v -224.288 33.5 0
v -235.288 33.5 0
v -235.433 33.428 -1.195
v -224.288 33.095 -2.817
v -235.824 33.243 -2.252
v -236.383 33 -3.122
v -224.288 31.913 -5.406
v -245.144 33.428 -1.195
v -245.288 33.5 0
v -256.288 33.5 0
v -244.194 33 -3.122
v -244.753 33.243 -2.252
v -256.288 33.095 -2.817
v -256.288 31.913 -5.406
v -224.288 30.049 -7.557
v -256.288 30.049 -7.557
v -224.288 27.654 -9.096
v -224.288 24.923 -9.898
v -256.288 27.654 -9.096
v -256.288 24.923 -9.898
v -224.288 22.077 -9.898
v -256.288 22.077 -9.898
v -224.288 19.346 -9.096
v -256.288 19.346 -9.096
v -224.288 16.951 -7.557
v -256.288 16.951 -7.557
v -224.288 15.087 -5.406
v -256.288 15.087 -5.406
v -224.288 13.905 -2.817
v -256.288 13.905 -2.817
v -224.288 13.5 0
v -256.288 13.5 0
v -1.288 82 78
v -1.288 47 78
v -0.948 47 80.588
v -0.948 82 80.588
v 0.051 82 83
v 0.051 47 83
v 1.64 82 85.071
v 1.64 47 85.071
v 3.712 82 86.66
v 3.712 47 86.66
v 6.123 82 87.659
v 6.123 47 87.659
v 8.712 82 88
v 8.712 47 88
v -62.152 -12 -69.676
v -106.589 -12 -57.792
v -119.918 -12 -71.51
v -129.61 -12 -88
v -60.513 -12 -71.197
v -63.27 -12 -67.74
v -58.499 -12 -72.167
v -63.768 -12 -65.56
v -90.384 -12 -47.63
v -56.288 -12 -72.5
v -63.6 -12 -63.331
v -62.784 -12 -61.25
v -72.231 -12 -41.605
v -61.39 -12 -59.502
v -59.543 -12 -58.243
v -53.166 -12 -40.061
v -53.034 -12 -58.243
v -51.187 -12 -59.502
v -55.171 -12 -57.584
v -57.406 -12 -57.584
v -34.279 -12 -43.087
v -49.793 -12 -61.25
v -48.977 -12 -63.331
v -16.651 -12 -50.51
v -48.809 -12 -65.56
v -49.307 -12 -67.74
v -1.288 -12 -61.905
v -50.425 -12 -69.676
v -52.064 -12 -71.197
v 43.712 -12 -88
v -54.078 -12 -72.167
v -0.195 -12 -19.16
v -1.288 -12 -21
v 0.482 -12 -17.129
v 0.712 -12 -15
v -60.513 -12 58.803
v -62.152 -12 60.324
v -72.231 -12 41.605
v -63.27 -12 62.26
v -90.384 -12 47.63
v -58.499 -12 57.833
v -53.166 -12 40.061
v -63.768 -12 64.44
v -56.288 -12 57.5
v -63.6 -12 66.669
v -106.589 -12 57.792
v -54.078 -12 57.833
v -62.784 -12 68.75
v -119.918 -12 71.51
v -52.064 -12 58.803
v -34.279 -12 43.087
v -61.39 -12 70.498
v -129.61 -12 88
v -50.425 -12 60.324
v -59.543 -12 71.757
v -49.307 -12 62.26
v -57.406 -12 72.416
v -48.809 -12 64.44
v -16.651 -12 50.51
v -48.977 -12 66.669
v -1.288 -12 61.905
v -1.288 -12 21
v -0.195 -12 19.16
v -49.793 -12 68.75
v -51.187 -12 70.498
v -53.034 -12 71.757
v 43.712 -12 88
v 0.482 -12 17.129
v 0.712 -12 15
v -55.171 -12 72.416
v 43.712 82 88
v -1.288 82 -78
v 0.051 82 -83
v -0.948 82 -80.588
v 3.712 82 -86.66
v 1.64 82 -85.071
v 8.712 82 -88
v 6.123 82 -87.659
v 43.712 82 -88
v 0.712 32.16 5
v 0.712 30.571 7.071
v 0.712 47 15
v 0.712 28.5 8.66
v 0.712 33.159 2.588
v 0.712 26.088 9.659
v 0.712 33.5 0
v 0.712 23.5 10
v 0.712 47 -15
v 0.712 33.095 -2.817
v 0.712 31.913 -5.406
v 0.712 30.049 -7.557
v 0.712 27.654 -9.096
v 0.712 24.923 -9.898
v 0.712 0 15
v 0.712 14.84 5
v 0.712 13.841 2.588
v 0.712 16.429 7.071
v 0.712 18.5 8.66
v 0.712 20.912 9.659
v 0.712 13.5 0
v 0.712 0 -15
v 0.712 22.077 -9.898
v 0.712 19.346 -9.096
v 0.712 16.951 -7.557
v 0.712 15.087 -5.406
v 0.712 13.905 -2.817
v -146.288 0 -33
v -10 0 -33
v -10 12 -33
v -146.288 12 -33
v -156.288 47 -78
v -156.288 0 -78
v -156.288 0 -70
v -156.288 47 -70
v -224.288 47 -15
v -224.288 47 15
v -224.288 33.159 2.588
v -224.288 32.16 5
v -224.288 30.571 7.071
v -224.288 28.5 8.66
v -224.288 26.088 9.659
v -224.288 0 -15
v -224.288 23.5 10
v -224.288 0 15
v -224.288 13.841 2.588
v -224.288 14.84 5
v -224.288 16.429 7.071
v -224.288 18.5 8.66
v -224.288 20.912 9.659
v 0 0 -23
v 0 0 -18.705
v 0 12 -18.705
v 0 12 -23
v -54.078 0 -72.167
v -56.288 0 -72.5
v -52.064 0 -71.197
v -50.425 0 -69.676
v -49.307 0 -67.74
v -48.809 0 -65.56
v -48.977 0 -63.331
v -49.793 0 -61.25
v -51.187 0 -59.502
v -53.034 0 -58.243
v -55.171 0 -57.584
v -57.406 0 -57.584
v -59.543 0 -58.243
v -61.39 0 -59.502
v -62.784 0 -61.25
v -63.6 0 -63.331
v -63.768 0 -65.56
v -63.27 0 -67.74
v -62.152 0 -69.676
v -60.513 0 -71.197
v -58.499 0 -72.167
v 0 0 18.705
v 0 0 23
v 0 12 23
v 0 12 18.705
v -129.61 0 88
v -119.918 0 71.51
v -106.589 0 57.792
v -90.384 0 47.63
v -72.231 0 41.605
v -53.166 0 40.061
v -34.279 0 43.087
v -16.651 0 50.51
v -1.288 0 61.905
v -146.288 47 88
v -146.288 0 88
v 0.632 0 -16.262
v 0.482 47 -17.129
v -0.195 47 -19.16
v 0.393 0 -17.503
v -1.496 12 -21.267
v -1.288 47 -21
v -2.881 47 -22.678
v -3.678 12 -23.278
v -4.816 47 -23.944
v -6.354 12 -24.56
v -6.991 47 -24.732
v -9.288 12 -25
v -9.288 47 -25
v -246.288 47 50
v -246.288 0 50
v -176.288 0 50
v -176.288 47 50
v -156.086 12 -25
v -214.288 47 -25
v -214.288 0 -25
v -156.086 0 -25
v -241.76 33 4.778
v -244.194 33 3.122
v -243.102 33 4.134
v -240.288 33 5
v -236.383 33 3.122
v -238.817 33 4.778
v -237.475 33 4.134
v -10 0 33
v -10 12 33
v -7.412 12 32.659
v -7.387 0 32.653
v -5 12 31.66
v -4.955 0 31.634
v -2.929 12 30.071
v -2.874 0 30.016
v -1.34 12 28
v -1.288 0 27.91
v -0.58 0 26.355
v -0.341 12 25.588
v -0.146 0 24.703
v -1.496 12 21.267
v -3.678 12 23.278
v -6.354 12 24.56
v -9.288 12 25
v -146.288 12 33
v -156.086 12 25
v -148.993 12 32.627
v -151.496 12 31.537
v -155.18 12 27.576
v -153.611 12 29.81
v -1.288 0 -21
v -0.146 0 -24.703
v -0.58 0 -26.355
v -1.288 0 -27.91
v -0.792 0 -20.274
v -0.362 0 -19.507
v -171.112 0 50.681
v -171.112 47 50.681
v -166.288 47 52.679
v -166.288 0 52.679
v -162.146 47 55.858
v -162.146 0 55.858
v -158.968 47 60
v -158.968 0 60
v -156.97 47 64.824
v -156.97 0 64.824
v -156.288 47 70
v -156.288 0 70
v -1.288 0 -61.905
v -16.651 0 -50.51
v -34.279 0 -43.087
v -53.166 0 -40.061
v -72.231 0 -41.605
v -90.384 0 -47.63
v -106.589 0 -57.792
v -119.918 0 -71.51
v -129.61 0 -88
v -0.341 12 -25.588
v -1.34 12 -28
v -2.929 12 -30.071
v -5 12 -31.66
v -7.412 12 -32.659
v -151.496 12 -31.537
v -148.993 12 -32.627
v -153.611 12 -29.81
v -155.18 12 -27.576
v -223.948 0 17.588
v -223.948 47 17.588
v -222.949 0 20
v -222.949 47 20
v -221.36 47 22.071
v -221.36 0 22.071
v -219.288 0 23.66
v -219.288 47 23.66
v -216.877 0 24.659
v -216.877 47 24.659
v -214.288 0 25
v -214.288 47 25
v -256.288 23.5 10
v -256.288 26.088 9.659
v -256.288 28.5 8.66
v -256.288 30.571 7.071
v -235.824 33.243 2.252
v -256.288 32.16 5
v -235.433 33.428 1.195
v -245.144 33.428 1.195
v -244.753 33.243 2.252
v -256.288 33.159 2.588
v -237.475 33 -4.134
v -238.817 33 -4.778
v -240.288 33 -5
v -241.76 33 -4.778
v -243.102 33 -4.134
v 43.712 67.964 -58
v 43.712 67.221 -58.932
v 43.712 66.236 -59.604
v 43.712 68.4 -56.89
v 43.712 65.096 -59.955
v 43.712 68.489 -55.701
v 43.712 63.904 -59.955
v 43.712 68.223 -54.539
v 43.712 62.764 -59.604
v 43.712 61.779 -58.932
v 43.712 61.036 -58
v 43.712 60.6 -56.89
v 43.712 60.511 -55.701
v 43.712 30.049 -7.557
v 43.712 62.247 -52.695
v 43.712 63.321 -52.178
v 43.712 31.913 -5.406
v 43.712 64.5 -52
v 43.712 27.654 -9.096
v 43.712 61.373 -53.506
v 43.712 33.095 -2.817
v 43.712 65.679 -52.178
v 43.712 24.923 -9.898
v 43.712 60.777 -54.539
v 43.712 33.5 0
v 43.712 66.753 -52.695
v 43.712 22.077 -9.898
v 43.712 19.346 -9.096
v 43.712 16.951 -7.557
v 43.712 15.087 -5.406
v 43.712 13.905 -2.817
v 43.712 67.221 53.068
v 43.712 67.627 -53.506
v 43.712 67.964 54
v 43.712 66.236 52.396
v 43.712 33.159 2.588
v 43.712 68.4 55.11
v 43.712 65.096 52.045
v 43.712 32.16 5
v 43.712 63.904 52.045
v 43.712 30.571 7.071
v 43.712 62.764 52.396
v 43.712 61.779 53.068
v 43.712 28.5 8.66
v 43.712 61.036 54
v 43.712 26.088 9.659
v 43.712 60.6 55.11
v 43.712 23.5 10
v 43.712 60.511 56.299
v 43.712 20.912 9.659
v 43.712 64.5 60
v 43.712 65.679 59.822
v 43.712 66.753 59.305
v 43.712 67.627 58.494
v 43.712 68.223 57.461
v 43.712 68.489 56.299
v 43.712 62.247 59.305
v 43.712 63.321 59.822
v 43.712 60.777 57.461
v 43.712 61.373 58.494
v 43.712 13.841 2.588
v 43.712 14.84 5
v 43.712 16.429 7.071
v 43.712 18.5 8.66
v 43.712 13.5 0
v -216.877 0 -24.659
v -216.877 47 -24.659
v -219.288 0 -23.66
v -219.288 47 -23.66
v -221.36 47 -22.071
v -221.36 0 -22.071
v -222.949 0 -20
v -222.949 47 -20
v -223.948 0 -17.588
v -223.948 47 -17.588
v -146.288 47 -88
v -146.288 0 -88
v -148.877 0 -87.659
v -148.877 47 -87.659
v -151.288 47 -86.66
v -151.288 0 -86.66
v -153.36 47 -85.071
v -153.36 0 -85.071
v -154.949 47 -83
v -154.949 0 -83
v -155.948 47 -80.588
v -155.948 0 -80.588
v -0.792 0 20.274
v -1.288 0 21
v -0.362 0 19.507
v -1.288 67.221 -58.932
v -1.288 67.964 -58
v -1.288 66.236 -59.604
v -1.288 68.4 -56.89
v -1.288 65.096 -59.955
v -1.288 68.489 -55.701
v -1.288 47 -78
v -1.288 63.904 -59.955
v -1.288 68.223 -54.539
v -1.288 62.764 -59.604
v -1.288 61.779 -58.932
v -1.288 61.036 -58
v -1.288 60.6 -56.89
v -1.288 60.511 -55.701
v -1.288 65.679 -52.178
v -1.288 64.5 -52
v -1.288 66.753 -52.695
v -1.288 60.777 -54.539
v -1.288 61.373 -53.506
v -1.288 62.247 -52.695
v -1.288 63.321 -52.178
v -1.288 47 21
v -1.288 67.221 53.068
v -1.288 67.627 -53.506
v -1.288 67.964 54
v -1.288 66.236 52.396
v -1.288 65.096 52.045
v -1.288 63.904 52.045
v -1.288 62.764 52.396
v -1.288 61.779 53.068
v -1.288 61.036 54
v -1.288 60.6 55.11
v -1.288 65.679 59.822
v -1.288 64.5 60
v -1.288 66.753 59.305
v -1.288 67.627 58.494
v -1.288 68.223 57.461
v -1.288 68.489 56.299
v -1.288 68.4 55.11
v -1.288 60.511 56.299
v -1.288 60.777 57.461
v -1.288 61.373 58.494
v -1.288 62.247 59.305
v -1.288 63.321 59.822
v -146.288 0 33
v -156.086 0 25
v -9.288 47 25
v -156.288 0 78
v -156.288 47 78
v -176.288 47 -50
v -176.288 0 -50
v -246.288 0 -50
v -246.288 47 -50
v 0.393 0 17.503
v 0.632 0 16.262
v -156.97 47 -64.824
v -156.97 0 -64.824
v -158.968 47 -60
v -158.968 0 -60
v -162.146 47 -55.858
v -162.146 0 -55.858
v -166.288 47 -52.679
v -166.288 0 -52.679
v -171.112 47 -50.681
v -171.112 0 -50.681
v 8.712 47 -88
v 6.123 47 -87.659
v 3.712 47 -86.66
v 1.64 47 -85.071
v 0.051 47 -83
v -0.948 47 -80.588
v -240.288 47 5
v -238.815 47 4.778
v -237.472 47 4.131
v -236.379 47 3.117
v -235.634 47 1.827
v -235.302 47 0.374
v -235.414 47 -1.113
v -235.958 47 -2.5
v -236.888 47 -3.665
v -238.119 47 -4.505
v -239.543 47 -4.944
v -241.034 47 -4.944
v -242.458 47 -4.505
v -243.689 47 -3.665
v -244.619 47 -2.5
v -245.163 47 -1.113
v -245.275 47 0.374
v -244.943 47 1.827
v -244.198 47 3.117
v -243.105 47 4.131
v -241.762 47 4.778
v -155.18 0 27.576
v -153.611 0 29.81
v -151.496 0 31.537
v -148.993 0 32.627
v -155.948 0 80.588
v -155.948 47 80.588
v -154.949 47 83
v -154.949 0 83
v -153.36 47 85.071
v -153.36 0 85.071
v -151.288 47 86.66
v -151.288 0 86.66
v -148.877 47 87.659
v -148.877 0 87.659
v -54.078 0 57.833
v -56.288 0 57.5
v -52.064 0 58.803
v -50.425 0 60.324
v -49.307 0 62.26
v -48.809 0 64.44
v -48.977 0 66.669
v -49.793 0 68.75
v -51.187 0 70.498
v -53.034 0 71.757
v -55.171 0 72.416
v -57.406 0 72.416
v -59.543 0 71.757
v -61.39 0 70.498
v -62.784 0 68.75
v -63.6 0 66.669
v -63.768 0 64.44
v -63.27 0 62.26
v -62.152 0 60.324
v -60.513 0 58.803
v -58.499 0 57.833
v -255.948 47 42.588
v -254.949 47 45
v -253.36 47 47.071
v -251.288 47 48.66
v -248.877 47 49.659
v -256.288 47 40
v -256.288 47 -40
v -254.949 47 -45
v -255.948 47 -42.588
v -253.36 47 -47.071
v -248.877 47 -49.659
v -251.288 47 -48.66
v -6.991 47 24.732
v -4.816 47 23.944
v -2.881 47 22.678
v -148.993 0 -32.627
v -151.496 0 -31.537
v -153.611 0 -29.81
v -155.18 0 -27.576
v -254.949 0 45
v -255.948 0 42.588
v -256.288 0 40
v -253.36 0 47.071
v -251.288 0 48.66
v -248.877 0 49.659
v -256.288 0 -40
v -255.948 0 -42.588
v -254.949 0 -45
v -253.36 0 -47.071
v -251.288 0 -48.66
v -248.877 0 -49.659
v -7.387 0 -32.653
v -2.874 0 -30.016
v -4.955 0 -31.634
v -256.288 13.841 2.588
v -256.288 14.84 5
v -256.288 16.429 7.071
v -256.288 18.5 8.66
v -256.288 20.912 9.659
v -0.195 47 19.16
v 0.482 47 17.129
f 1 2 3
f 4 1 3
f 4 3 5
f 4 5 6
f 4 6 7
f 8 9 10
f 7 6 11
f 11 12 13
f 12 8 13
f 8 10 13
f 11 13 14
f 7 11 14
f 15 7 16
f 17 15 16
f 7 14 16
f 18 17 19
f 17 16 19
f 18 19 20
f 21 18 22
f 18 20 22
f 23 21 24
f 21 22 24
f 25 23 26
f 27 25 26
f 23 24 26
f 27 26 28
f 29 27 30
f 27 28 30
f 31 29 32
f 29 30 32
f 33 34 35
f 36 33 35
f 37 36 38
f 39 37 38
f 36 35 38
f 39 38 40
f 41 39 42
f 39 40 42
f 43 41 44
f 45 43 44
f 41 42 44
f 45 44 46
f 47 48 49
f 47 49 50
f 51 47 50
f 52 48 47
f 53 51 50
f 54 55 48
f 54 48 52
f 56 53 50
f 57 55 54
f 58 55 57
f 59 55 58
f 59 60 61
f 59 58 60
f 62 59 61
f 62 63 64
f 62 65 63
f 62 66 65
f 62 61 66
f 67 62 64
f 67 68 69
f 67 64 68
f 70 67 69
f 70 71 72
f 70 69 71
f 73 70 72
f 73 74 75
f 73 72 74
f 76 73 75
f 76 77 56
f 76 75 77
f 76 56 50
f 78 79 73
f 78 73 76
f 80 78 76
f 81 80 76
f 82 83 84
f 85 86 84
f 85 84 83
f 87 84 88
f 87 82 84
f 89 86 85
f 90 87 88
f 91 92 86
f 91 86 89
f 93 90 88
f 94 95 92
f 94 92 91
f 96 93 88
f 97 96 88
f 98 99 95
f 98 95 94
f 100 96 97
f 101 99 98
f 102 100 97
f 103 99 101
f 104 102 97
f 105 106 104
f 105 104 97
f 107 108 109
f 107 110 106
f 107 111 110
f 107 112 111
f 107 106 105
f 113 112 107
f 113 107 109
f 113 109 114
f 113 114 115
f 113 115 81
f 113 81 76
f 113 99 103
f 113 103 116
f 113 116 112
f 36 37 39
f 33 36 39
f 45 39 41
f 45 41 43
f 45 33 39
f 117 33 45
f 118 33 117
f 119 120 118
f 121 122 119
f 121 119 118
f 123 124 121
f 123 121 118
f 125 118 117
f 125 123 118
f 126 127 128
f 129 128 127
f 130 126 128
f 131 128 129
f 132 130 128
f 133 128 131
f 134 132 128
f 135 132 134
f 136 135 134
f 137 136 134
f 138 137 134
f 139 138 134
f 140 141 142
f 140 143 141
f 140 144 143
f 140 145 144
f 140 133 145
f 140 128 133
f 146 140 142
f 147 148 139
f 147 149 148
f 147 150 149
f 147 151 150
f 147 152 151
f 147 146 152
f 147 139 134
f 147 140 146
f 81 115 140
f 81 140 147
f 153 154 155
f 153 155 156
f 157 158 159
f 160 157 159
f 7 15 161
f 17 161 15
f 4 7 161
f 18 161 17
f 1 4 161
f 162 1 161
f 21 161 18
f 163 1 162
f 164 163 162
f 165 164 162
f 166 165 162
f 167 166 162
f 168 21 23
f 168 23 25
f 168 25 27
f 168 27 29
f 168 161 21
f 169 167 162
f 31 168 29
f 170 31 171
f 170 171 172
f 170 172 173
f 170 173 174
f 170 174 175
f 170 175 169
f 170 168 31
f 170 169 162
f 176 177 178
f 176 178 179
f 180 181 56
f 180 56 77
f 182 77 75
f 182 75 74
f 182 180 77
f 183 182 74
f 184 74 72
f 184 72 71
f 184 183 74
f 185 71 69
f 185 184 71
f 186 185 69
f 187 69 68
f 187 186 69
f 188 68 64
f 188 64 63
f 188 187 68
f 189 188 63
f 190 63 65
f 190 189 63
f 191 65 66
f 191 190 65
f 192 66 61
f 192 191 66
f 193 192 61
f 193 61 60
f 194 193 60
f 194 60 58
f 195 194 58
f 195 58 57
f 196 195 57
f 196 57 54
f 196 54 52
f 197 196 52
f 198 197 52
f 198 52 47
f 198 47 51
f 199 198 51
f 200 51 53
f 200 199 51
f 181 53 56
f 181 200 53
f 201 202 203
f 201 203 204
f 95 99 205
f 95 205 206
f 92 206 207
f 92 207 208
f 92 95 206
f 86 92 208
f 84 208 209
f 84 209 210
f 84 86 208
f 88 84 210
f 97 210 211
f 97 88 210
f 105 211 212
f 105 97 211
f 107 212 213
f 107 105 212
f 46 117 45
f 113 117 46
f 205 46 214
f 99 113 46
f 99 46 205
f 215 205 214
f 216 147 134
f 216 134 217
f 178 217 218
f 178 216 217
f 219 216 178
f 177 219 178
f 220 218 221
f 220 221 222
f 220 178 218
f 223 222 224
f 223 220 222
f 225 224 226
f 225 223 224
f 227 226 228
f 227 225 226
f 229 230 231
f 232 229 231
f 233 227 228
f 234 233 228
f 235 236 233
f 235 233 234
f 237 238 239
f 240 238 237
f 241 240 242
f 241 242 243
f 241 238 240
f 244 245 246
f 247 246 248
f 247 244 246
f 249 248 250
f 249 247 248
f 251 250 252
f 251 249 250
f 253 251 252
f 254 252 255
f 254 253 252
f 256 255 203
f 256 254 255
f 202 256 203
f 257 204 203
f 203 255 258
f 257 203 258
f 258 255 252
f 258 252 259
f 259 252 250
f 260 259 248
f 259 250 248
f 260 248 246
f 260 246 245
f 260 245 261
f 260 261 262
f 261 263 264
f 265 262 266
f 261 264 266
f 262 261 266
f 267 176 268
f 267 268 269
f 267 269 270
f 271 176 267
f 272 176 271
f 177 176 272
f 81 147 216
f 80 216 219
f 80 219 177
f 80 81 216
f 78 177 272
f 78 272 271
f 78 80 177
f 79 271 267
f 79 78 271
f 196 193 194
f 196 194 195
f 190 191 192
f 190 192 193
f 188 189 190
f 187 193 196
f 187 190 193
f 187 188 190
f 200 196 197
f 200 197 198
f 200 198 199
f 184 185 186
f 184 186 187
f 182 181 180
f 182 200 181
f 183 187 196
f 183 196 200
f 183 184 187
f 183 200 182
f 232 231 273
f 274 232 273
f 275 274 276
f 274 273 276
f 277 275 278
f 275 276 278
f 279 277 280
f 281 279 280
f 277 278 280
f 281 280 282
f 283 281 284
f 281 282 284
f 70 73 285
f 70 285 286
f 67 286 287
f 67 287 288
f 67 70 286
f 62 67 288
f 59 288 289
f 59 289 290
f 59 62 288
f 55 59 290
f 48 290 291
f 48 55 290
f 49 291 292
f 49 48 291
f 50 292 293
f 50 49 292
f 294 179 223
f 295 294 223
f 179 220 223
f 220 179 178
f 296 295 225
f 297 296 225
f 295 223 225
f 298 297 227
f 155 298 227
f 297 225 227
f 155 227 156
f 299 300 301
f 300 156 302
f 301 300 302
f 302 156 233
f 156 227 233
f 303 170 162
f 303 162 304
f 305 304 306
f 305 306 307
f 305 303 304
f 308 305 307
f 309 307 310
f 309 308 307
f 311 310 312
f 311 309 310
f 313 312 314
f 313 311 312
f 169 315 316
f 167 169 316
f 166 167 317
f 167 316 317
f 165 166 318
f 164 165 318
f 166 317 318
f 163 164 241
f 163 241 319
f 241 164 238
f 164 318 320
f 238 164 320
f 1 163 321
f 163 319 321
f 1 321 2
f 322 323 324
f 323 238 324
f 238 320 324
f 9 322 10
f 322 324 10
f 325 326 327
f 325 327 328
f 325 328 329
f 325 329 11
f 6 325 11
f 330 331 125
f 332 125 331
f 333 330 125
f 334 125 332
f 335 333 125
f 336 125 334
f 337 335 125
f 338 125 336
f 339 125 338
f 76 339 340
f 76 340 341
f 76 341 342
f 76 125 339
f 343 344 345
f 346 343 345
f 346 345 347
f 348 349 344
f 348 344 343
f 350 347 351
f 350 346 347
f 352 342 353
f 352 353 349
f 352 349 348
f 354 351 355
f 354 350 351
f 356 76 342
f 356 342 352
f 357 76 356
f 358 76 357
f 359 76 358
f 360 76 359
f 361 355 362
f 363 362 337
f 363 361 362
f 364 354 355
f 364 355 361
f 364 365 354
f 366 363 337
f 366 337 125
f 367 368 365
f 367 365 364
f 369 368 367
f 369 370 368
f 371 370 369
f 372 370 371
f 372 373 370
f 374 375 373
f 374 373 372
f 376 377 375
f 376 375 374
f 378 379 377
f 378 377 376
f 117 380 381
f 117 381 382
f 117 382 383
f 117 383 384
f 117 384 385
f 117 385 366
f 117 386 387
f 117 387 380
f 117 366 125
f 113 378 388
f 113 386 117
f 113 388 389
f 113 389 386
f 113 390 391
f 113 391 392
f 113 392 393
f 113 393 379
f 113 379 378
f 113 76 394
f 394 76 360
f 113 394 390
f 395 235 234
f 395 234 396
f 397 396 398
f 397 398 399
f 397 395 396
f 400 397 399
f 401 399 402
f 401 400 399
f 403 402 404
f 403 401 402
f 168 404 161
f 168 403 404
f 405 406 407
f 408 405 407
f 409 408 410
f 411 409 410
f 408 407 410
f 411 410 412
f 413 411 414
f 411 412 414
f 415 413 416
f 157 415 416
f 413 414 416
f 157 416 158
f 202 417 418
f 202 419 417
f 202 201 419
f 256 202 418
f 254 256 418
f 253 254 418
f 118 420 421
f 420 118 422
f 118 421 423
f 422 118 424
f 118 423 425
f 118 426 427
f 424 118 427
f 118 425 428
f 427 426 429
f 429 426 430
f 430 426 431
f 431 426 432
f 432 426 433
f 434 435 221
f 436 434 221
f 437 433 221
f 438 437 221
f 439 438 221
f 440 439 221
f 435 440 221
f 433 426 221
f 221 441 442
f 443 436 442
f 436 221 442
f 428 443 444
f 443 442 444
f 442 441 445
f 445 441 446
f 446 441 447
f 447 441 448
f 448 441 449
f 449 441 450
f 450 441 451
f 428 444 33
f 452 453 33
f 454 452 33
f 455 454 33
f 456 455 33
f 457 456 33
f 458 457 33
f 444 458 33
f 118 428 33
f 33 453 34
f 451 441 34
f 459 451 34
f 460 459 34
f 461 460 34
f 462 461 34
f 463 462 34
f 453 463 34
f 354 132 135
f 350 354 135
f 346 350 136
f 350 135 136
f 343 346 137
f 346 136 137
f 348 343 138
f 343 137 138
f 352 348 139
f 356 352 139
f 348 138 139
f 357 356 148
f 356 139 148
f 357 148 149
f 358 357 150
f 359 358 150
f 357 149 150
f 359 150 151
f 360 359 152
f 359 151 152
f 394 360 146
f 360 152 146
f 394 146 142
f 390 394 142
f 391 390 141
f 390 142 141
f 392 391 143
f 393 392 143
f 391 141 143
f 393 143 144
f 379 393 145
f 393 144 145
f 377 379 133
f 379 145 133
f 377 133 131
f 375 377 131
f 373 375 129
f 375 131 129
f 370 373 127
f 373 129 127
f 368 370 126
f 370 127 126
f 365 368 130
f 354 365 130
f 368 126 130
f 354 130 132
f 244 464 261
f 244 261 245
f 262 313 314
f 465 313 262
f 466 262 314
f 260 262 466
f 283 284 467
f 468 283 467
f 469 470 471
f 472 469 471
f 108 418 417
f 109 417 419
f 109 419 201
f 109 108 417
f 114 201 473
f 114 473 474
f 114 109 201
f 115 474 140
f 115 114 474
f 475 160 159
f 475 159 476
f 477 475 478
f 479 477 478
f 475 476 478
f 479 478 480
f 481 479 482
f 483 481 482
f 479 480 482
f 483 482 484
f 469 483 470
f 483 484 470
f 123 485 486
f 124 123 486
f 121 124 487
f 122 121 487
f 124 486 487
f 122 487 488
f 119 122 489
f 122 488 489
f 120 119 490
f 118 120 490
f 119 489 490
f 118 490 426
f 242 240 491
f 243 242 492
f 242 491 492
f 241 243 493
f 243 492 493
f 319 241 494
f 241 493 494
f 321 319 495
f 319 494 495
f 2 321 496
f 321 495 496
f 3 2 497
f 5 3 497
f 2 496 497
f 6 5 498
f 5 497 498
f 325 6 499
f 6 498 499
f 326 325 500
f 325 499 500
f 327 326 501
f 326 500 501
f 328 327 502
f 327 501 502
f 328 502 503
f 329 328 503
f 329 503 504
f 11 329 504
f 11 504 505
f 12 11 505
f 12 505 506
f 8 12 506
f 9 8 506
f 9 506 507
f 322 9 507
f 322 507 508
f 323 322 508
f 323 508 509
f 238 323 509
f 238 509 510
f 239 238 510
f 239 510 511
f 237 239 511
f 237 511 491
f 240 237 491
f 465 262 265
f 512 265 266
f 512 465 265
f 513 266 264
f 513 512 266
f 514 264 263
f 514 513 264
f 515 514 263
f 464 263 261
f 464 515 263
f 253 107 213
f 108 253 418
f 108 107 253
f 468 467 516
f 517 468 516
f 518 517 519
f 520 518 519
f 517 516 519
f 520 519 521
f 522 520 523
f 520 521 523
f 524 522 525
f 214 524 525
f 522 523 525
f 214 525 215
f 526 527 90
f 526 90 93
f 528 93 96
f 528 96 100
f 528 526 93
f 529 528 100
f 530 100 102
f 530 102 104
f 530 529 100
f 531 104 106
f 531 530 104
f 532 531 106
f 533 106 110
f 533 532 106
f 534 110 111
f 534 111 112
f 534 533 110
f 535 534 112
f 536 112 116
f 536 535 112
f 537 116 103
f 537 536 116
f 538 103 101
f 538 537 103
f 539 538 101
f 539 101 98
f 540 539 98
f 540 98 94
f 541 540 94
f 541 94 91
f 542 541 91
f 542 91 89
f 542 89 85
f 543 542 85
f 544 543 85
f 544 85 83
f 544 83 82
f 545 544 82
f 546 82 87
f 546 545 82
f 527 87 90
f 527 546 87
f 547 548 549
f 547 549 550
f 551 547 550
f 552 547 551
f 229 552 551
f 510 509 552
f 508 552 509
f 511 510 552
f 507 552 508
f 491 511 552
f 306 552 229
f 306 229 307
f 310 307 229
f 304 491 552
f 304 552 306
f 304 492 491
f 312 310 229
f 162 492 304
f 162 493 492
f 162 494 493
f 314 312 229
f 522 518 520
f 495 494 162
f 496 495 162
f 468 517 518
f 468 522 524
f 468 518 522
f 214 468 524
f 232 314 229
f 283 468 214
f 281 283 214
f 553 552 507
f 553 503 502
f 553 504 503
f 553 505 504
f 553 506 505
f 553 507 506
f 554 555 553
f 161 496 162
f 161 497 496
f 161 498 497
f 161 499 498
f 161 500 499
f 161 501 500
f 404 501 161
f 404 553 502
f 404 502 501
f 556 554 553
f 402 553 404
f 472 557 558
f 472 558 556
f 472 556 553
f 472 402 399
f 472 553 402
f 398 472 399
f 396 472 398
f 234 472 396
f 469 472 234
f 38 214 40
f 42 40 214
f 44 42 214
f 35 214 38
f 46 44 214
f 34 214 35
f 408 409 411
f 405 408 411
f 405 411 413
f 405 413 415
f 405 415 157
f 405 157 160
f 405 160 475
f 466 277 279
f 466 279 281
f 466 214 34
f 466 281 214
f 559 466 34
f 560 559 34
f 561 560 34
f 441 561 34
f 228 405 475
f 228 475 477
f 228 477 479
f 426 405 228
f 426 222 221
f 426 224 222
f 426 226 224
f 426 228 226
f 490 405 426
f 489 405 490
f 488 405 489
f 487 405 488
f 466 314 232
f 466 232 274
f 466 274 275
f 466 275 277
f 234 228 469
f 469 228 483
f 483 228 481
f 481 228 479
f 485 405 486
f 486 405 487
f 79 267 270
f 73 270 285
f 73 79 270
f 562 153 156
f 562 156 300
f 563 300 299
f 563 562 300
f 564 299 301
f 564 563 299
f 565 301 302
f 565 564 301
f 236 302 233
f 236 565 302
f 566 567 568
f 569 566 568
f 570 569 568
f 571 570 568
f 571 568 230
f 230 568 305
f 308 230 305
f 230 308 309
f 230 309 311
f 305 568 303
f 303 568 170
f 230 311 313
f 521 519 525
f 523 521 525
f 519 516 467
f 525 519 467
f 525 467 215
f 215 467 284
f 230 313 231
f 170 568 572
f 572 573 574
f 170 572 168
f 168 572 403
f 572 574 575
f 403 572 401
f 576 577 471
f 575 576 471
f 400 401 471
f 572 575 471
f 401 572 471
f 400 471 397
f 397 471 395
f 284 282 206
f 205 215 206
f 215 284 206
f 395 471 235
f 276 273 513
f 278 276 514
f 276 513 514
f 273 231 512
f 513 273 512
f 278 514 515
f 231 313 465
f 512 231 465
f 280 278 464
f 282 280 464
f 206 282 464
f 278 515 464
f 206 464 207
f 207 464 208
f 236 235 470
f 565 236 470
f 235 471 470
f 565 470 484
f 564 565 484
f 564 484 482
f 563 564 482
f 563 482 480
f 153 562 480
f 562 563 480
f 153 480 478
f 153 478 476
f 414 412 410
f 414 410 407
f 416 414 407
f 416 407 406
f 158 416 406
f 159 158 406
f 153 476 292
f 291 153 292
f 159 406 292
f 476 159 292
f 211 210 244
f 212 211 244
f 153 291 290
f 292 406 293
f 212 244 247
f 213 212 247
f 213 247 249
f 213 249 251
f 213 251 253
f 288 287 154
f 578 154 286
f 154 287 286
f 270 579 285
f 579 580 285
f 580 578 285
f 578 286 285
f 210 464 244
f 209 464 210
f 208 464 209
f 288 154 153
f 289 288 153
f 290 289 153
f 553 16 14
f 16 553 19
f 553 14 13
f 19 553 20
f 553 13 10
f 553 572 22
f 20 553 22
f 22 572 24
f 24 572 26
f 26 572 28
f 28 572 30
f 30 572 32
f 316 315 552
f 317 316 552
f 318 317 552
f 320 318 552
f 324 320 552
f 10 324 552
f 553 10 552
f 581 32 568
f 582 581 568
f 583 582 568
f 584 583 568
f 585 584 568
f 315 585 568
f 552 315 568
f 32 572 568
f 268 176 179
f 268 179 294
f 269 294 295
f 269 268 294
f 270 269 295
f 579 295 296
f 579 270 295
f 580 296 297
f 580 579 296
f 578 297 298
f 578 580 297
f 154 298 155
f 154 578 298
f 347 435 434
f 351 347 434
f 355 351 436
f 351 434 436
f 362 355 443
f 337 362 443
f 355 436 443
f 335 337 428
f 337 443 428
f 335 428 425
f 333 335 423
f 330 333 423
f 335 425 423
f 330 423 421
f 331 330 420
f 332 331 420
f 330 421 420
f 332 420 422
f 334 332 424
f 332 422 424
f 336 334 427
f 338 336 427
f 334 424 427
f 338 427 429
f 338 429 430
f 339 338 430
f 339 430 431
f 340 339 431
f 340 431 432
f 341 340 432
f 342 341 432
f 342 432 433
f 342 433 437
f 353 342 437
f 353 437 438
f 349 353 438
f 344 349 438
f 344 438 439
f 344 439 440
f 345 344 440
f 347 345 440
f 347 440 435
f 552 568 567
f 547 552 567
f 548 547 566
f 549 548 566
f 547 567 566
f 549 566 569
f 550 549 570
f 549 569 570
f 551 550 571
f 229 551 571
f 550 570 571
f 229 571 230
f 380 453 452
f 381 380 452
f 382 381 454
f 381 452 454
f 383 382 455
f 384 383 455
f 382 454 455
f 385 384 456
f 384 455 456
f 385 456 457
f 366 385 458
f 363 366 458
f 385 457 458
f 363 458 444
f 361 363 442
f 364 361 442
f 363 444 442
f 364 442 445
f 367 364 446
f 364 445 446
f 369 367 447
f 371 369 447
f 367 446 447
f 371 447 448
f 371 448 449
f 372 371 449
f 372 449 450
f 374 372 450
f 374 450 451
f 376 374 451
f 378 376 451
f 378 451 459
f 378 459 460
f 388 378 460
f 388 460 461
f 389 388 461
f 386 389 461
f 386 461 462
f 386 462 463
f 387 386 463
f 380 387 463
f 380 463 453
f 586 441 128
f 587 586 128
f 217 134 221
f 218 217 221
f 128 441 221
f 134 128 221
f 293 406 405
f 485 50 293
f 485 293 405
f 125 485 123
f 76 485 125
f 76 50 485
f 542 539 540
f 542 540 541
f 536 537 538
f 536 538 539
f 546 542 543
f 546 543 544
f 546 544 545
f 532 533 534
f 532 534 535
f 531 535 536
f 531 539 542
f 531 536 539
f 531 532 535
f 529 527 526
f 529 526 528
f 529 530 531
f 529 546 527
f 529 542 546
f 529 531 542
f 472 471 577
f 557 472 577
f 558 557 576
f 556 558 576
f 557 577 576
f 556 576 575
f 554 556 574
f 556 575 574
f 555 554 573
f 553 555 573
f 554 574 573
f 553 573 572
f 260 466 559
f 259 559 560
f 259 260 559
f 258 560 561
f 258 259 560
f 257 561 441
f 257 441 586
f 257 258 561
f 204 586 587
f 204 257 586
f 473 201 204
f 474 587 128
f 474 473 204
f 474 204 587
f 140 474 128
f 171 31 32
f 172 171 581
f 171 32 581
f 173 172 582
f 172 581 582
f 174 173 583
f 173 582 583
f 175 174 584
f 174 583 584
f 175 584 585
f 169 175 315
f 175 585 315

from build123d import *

# Parameters (mm, degrees)
BOSS_EXTRUDE1_DEPTH = 47
BOSS_EXTRUDE2_DEPTH = 35
BOSS_EXTRUDE3_START = 12
BOSS_EXTRUDE3_DEPTH = 12
SKETCH3_R           = 4
CUT_EXTRUDE1_DEPTH  = 324.215098657
SKETCH6_R           = 7.5
CUT_EXTRUDE3_DEPTH  = 12
CUT_EXTRUDE2_DEPTH  = 12
SKETCH8_R           = 5
CUT_EXTRUDE4_DEPTH  = 14


with BuildPart() as part:
    # Sketch1 → Boss-Extrude1 (new body)
    with BuildSketch(Plane(origin=(0, 0, 0), x_dir=(1, 0, 0), z_dir=(0, 1, 0))):
        with BuildLine():
            Line((-256.288485132, 40), (-256.288485132, -40))
            ThreePointArc((-256.288485132, -40), (-253.359552944, -47.071067812), (-246.288485132, -50))
            Line((-246.288485132, -50), (-176.288485132, -50))
            ThreePointArc((-176.288485132, -50), (-162.146349509, -55.857864376), (-156.288485132, -70))
            Line((-156.288485132, -70), (-156.288485132, -78))
            ThreePointArc((-156.288485132, -78), (-153.359552944, -85.071067812), (-146.288485132, -88))
            Line((-146.288485132, -88), (43.711514868, -88))
            Line((43.711514868, -88), (43.711514868, 88))
            Line((43.711514868, 88), (-146.288485132, 88))
            ThreePointArc((-146.288485132, 88), (-153.359552944, 85.071067812), (-156.288485132, 78))
            Line((-156.288485132, 78), (-156.288485132, 70))
            ThreePointArc((-156.288485132, 70), (-162.146349509, 55.857864376), (-176.288485132, 50))
            Line((-176.288485132, 50), (-246.288485132, 50))
            ThreePointArc((-246.288485132, 50), (-253.359552944, 47.071067812), (-256.288485132, 40))
        make_face()
        with BuildLine():
            Line((-224.288485132, 15), (-224.288485132, -15))
            ThreePointArc((-224.288485132, -15), (-221.359552944, -22.071067812), (-214.288485132, -25))
            Line((-214.288485132, -25), (-9.288485132, -25))
            ThreePointArc((-9.288485132, -25), (-2.217417321, -22.071067812), (0.711514868, -15))
            Line((0.711514868, -15), (0.711514868, 15))
            ThreePointArc((0.711514868, 15), (-2.217417321, 22.071067812), (-9.288485132, 25))
            Line((-9.288485132, 25), (-214.288485132, 25))
            ThreePointArc((-214.288485132, 25), (-221.359552944, 22.071067812), (-224.288485132, 15))
        make_face(mode=Mode.SUBTRACT)
    extrude(amount=BOSS_EXTRUDE1_DEPTH)

    # Sketch2 → Boss-Extrude2 (add)
    with BuildSketch(Plane(origin=(0, 47, 0), x_dir=(1, 0, 0), z_dir=(0, 1, 0))):
        with BuildLine():
            Line((43.711514868, -88), (43.711514868, 88))
            Line((43.711514868, 88), (8.711514868, 88))
            ThreePointArc((8.711514868, 88), (1.640447056, 85.071067812), (-1.288485132, 78))
            Line((-1.288485132, 78), (-1.288485132, -78))
            ThreePointArc((-1.288485132, -78), (1.640447056, -85.071067812), (8.711514868, -88))
            Line((8.711514868, -88), (43.711514868, -88))
        make_face()
    extrude(amount=BOSS_EXTRUDE2_DEPTH)

    # Sketch7 → Boss-Extrude3 (add)
    with BuildSketch(Plane.XZ.offset(BOSS_EXTRUDE3_START)):
        with BuildLine():
            ThreePointArc((-1.288485132, -61.905249807), (-72.230589483, -41.6045326), (-129.609696252, -88))
            Line((-129.609696252, -88), (43.711514868, -88))
            Line((43.711514868, -88), (43.711514868, 88))
            Line((43.711514868, 88), (-129.609696252, 88))
            ThreePointArc((-129.609696252, 88), (-72.230589483, 41.6045326), (-1.288485132, 61.905249807))
            Line((-1.288485132, 61.905249807), (-1.288485132, 21))
            ThreePointArc((-1.288485132, 21), (0.198347848, 18.16227766), (0.711514868, 15))
            Line((0.711514868, 15), (0.711514868, -15))
            ThreePointArc((0.711514868, -15), (0.198347848, -18.16227766), (-1.288485132, -21))
            Line((-1.288485132, -21), (-1.288485132, -61.905249807))
        make_face()
    extrude(amount=-BOSS_EXTRUDE3_DEPTH)

    # Sketch3 → Cut-Extrude1 (cut, through all)
    with BuildSketch(Plane.ZY.offset(256.288485132)):
        with BuildLine():
            ThreePointArc((0, 33.5), (-10, 23.5), (0, 13.5))
            Line((0, 13.5), (0, 33.5))
        make_face()
        with BuildLine():
            Line((0, 33.5), (0, 13.5))
            ThreePointArc((0, 13.5), (7.071067812, 16.428932188), (10, 23.5))
            ThreePointArc((10, 23.5), (7.071067812, 30.571067812), (0, 33.5))
        make_face()
        with Locations((56, 64.5)):
            Circle(SKETCH3_R)
        with Locations((-56, 64.5)):
            Circle(SKETCH3_R)
    extrude(amount=-CUT_EXTRUDE1_DEPTH, mode=Mode.SUBTRACT)

    # Sketch6 → Cut-Extrude3 (cut)
    with BuildSketch(Plane.XZ):
        with Locations(Location((-56.288485132, 65, 0), (0, 0, 270))):
            Circle(SKETCH6_R)
        with Locations(Location((-56.288485132, -65, 0), (0, 0, 270))):
            Circle(SKETCH6_R)
    extrude(amount=CUT_EXTRUDE3_DEPTH, mode=Mode.SUBTRACT)

    # Sketch5 → Cut-Extrude2 (cut)
    with BuildSketch(Plane.XZ):
        with BuildLine():
            Line((0, 23), (0, -23))
            ThreePointArc((0, -23), (-2.928932188, -30.071067812), (-10, -33))
            Line((-10, -33), (-146.288485132, -33))
            ThreePointArc((-146.288485132, -33), (-153.359552944, -30.071067812), (-156.288485132, -23))
            Line((-156.288485132, -23), (-156.288485132, 23))
            ThreePointArc((-156.288485132, 23), (-153.359552944, 30.071067812), (-146.288485132, 33))
            Line((-146.288485132, 33), (-10, 33))
            ThreePointArc((-10, 33), (-2.928932188, 30.071067812), (0, 23))
        make_face()
    extrude(amount=-CUT_EXTRUDE2_DEPTH, mode=Mode.SUBTRACT)

    # Sketch8 → Cut-Extrude4 (cut)
    with BuildSketch(Plane(origin=(0, 47, 0), x_dir=(1, 0, 0), z_dir=(0, 1, 0))):
        with Locations(Location((-240.288485132, 0, 0), (0, 0, 270))):
            Circle(SKETCH8_R)
    extrude(amount=-CUT_EXTRUDE4_DEPTH, mode=Mode.SUBTRACT)


solid = part.part
